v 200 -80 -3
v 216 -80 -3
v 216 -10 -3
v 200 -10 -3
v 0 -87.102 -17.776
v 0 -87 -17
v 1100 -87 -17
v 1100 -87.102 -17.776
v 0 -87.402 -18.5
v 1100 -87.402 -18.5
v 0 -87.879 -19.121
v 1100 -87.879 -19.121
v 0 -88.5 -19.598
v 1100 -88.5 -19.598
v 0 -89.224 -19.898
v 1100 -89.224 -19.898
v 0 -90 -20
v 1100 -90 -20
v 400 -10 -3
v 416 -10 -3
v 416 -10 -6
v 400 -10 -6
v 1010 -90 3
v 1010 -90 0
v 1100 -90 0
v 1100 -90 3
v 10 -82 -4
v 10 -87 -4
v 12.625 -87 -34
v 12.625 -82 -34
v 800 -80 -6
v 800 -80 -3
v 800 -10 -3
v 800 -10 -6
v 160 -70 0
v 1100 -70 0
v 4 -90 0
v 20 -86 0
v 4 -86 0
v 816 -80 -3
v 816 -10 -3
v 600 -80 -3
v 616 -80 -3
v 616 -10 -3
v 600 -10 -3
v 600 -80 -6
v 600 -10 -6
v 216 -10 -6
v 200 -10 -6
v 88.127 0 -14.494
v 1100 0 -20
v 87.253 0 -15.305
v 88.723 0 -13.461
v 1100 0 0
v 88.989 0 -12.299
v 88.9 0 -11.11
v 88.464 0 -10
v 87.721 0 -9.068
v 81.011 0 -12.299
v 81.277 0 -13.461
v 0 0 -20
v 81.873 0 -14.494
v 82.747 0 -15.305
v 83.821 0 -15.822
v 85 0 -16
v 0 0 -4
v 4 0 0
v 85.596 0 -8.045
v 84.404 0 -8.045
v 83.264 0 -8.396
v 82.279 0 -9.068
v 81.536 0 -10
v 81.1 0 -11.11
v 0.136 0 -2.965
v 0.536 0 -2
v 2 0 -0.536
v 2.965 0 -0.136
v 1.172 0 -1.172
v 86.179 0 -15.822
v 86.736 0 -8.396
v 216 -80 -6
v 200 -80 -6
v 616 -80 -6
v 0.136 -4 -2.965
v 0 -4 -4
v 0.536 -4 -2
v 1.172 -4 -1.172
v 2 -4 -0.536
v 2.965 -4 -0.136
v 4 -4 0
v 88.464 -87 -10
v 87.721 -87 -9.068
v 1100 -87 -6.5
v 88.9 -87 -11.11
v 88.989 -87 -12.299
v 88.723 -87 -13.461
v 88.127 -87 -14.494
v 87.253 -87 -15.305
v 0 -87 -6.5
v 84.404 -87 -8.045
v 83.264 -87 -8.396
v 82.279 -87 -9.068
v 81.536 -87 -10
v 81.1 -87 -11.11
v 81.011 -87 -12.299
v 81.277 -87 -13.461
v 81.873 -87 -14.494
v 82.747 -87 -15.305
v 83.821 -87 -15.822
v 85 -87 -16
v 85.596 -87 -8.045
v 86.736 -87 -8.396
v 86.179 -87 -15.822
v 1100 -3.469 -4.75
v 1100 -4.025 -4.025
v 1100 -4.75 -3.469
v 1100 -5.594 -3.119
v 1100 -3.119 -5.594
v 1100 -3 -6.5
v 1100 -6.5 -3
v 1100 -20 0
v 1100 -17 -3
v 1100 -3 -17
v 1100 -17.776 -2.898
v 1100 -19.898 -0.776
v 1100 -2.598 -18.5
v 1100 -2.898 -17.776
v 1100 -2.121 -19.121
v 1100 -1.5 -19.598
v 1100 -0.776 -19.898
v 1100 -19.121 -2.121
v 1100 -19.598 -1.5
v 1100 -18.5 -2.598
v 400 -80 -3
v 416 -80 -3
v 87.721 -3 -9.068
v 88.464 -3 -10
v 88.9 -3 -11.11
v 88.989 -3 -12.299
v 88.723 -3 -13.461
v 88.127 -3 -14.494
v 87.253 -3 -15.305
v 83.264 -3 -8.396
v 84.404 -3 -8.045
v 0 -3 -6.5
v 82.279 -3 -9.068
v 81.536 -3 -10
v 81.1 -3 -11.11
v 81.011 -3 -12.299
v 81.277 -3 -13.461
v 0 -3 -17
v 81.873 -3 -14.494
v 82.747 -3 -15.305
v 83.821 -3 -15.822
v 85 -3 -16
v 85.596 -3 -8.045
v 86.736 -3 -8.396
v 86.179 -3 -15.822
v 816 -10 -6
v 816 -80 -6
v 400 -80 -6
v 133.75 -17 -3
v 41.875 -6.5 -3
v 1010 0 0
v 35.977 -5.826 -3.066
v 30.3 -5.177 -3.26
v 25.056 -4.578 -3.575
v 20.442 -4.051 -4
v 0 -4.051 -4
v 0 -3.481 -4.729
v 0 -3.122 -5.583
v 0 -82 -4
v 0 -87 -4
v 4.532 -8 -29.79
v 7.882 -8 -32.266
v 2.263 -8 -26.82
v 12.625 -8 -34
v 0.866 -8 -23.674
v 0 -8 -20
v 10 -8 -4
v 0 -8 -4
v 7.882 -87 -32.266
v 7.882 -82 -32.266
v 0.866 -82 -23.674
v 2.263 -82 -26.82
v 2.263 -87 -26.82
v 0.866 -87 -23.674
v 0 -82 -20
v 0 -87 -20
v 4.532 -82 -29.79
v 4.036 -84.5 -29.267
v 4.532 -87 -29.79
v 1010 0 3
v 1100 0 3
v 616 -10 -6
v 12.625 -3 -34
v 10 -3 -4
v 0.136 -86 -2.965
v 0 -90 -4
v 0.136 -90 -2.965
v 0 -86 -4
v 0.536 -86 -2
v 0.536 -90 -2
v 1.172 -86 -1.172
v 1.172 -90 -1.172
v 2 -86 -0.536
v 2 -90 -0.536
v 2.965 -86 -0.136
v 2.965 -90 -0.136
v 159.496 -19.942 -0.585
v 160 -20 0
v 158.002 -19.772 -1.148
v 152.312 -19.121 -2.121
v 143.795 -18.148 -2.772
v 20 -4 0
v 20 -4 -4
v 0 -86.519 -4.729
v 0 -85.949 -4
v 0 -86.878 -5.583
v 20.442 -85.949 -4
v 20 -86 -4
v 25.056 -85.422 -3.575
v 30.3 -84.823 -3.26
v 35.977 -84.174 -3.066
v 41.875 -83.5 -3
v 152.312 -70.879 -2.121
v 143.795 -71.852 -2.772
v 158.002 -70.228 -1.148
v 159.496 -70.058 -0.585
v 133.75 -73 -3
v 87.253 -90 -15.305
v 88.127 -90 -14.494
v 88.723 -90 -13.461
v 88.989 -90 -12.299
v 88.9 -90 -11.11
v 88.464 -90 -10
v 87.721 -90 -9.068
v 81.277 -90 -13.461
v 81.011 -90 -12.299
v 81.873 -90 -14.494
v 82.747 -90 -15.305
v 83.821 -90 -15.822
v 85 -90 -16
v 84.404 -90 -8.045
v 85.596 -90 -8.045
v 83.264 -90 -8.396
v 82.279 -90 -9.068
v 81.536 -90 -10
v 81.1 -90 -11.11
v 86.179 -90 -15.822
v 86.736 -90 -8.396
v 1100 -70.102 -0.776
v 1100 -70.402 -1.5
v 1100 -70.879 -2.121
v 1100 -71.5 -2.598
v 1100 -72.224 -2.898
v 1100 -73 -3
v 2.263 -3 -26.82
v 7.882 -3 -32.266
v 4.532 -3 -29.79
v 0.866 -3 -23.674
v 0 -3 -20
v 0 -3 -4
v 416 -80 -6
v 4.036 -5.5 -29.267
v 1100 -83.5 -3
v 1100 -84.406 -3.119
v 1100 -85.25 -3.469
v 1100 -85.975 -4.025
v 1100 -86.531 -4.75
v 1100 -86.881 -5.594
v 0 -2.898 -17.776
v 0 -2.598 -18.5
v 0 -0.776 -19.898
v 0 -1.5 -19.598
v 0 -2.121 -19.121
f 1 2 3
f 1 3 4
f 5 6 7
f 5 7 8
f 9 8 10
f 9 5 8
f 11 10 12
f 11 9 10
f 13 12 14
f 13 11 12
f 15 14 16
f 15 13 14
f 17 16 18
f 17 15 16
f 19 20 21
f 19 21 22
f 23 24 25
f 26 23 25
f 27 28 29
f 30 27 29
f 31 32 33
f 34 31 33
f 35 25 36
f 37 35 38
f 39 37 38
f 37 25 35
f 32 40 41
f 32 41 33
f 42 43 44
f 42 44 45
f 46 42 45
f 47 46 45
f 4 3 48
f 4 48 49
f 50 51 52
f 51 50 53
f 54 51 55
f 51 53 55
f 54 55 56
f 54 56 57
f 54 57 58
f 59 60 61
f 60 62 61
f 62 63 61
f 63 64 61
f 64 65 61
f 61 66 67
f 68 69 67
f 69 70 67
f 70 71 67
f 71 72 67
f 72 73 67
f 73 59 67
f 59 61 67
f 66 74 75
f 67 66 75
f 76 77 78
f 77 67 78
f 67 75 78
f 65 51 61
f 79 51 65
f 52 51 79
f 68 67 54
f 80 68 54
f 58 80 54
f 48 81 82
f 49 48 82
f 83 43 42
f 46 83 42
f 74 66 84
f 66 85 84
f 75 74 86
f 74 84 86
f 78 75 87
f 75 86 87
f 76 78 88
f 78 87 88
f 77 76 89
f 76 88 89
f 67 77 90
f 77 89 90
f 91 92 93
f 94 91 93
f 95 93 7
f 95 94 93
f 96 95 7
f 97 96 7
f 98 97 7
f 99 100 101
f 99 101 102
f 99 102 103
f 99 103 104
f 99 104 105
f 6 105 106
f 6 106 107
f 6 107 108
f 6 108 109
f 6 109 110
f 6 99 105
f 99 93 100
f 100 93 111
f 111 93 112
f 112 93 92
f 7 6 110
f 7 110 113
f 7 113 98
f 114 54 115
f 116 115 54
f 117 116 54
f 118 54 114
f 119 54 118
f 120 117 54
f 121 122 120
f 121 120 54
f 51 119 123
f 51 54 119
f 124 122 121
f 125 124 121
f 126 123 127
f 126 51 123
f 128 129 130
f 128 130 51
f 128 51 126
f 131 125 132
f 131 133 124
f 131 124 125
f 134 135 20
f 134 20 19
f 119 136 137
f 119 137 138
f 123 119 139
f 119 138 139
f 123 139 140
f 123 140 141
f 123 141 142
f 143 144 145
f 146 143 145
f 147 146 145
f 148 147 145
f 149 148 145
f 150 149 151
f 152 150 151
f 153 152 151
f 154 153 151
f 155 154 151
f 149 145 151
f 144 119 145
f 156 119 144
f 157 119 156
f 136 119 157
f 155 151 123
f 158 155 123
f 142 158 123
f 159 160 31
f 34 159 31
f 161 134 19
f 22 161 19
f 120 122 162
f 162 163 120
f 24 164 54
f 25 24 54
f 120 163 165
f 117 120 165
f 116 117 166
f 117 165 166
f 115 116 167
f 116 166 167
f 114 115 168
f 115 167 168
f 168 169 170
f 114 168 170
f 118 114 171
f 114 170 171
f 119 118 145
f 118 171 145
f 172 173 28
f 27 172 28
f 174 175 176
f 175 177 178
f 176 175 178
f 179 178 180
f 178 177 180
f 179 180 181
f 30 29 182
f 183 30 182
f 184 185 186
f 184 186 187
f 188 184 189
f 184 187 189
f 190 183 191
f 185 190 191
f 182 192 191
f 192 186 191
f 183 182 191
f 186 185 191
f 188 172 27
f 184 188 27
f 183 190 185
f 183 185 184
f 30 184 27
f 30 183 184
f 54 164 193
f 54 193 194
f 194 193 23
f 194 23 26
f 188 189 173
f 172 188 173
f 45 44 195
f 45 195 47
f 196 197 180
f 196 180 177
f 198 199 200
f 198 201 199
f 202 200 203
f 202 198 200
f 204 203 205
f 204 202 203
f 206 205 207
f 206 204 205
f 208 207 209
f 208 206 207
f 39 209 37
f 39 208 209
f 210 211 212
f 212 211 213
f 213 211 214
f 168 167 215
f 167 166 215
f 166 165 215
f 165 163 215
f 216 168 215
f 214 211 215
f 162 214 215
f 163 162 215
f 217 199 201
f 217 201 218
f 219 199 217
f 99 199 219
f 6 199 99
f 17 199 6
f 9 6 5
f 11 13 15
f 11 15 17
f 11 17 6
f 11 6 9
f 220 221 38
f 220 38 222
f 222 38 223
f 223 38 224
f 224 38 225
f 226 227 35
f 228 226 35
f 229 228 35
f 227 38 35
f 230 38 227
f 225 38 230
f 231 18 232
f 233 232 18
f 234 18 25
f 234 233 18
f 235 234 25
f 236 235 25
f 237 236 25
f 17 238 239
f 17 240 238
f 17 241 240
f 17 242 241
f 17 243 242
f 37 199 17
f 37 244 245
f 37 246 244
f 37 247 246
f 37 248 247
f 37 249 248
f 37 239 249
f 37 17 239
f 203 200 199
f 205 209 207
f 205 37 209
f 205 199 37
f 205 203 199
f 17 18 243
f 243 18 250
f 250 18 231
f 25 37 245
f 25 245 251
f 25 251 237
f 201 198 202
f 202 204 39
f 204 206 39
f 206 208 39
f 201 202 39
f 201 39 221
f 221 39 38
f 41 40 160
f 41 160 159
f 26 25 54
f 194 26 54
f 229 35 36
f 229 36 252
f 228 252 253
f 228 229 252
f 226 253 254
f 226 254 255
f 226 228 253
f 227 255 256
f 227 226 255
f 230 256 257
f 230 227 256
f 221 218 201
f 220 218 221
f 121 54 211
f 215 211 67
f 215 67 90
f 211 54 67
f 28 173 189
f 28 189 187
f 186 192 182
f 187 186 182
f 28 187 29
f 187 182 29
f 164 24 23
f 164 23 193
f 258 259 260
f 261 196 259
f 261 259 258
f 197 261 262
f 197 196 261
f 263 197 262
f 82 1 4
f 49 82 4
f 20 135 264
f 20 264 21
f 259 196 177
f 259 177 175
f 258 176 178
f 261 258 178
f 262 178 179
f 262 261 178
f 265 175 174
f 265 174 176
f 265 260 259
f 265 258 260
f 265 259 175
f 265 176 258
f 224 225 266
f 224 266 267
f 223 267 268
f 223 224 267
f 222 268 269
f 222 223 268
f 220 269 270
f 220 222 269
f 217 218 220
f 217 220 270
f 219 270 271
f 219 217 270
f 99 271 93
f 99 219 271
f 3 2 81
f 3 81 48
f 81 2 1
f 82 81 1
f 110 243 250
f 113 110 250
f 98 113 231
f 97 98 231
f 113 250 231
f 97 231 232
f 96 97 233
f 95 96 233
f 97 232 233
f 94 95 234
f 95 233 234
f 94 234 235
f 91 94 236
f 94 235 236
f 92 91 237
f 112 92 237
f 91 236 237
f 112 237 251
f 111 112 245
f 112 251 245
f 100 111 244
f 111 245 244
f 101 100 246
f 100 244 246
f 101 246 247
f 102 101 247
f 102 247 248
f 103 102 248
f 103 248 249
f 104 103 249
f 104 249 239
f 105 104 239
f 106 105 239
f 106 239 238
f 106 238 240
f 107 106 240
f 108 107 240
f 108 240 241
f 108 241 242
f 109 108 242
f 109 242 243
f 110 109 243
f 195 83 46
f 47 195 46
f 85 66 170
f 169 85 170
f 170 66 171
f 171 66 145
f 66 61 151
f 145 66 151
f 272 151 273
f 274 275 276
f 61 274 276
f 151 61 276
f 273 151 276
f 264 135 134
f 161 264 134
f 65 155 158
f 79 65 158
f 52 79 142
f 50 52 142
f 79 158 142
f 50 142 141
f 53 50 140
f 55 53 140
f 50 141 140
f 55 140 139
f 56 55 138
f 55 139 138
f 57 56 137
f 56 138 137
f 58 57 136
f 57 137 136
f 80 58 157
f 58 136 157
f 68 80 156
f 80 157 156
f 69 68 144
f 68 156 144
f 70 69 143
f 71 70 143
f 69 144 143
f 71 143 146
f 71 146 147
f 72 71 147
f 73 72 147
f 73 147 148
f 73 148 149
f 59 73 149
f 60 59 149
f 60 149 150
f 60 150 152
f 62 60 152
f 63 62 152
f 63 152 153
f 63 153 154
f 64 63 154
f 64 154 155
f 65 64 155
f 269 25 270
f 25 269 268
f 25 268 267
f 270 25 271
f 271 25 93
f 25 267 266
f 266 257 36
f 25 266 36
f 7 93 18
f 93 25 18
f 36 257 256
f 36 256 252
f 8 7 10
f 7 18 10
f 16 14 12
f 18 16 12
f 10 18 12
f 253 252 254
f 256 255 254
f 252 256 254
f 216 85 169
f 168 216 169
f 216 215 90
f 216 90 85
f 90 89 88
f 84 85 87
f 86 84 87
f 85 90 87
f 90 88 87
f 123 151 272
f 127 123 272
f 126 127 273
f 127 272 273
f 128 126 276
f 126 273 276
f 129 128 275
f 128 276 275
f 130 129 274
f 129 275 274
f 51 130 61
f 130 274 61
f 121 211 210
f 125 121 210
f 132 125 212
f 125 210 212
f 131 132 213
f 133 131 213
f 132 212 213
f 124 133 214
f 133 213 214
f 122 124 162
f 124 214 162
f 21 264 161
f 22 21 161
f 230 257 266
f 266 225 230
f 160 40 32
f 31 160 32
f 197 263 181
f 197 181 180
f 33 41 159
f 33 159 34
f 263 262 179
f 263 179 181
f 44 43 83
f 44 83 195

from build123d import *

# Parameters (mm, degrees)
L_ANGLE_EQUAL_20X20X3_6_DEPTH = 1100
L_ANGLE_EQUAL_20X20X3_7_DEPTH = 1100
SKETCH16_R                    = 4
CUT_EXTRUDE1_DEPTH            = 1104.85687478
SKETCH18_W                    = 90
SKETCH18_H                    = 90
BOSS_EXTRUDE1_DEPTH           = 3
CUT_EXTRUDE2_DEPTH            = 4
BOSS_EXTRUDE2_DEPTH           = 5
BOSS_EXTRUDE3_DEPTH           = 5
FILLET1_R                     = 4
FILLET2_R                     = 4
SKETCH23_W                    = 16
SKETCH23_H                    = 70
BOSS_EXTRUDE4_DEPTH           = 3
BOSS_EXTRUDE4_2_DEPTH         = 3
BOSS_EXTRUDE4_3_DEPTH         = 3
BOSS_EXTRUDE4_4_DEPTH         = 3


with BuildPart() as part:
    # Sketch17 → L angle (equal) 20X20X3(6) (new body)
    with BuildSketch(Plane(origin=(0, 0, 0), x_dir=(0, -1, 0), z_dir=(1, 0, 0))):
        with BuildLine():
            Line((0, 20), (0, 0))
            Line((0, 0), (20, 0))
            ThreePointArc((20, 0), (19.121320344, 2.121320344), (17, 3))
            Line((17, 3), (6.5, 3))
            ThreePointArc((6.5, 3), (4.025126266, 4.025126266), (3, 6.5))
            Line((3, 6.5), (3, 17))
            ThreePointArc((3, 17), (2.121320344, 19.121320344), (0, 20))
        make_face()
    extrude(amount=L_ANGLE_EQUAL_20X20X3_6_DEPTH)


with BuildPart() as body_2:
    # Sketch19 → L angle (equal) 20X20X3(7) (new body)
    with BuildSketch(Plane(origin=(0, -90, 0), x_dir=(0, 1, 0), z_dir=(-1, 0, 0))):
        with BuildLine():
            Line((0, 20), (0, 0))
            Line((0, 0), (20, 0))
            ThreePointArc((20, 0), (19.121320344, 2.121320344), (17, 3))
            Line((17, 3), (6.5, 3))
            ThreePointArc((6.5, 3), (4.025126266, 4.025126266), (3, 6.5))
            Line((3, 6.5), (3, 17))
            ThreePointArc((3, 17), (2.121320344, 19.121320344), (0, 20))
        make_face()
    extrude(amount=-L_ANGLE_EQUAL_20X20X3_7_DEPTH)


with BuildPart() as cut_extrude1_tool:
    # Sketch16 → Cut-Extrude1 (new, through all)
    with BuildSketch(Plane.XZ.offset(90)):
        with Locations(Location((85, -12, 0), (0, 0, 270))):
            Circle(SKETCH16_R)
    extrude(amount=-CUT_EXTRUDE1_DEPTH)


with BuildPart() as part_1:
    add(part.part)

    # Cut-Extrude1: cut by cut_extrude1_tool
    add(cut_extrude1_tool.part, mode=Mode.SUBTRACT)


with BuildPart() as body_2_1:
    add(body_2.part)

    # Cut-Extrude1: cut by cut_extrude1_tool
    add(cut_extrude1_tool.part, mode=Mode.SUBTRACT)


with BuildPart() as body_3:
    # Sketch18 → Boss-Extrude1 (new body)
    with BuildSketch(Plane.XY):
        with Locations((1055, -45)):
            Rectangle(SKETCH18_W, SKETCH18_H)
    extrude(amount=BOSS_EXTRUDE1_DEPTH)


with BuildPart() as cut_extrude2_tool:
    # Sketch20 → Cut-Extrude2 (new body)
    with BuildSketch(Plane.XY):
        Polygon((0, -86), (20, -86), (160, -70), (0, -70), align=None)
        Polygon((0, -20), (160, -20), (20, -4), (0, -4), align=None)
    extrude(amount=-CUT_EXTRUDE2_DEPTH)


with BuildPart() as part_2:
    add(part_1.part)

    # Cut-Extrude2: cut by cut_extrude2_tool
    add(cut_extrude2_tool.part, mode=Mode.SUBTRACT)

    # Fillet2
    fillet2_edges = [part_2.edges().sort_by_distance(p)[0] for p in [
        (0, -2, 0),
    ]]
    fillet(fillet2_edges, radius=FILLET2_R)


with BuildPart() as body_2_2:
    add(body_2_1.part)

    # Cut-Extrude2: cut by cut_extrude2_tool
    add(cut_extrude2_tool.part, mode=Mode.SUBTRACT)

    # Fillet1
    fillet1_edges = [body_2_2.edges().sort_by_distance(p)[0] for p in [
        (0, -88, 0),
    ]]
    fillet(fillet1_edges, radius=FILLET1_R)


with BuildPart() as body_4:
    # Sketch21 → Boss-Extrude2 (new body)
    with BuildSketch(Plane.XZ.offset(3)):
        with BuildLine():
            Line((0, -4), (10, -4))
            Line((10, -4), (12.62465991, -34))
            add(Edge.make_bspline(
                [(12.62465991, -34), (1.75888124, -31.534337235), (0, -20)],
                knots=[0, 0, 0, 1, 1, 1], degree=2))
            Line((0, -20), (0, -4))
        make_face()
    extrude(amount=BOSS_EXTRUDE2_DEPTH)


with BuildPart() as body_5:
    # Sketch22 → Boss-Extrude3 (new body)
    with BuildSketch(Plane(origin=(0, -87, 0), x_dir=(1, 0, 0), z_dir=(0, 1, 0))):
        with BuildLine():
            Line((0, 20), (0, 4))
            Line((0, 4), (10, 4))
            Line((10, 4), (12.62465991, 34))
            add(Edge.make_bspline(
                [(12.62465991, 34), (1.75888124, 31.534337235), (0, 20)],
                knots=[0, 0, 0, 1, 1, 1], degree=2))
        make_face()
    extrude(amount=BOSS_EXTRUDE3_DEPTH)


with BuildPart() as body_6:
    # Sketch23 → Boss-Extrude4 (new body)
    with BuildSketch(Plane(origin=(0, 0, -3), x_dir=(-1, 0, 0), z_dir=(0, 0, -1))):
        with Locations((-408, -45)):
            Rectangle(SKETCH23_W, SKETCH23_H)
    extrude(amount=BOSS_EXTRUDE4_DEPTH)


with BuildPart() as body_7:
    # Sketch23 → Boss-Extrude4 2 (new body)
    with BuildSketch(Plane(origin=(0, 0, -3), x_dir=(-1, 0, 0), z_dir=(0, 0, -1))):
        with Locations((-608, -45)):
            Rectangle(SKETCH23_W, SKETCH23_H)
    extrude(amount=BOSS_EXTRUDE4_2_DEPTH)


with BuildPart() as body_8:
    # Sketch23 → Boss-Extrude4 3 (new body)
    with BuildSketch(Plane(origin=(0, 0, -3), x_dir=(-1, 0, 0), z_dir=(0, 0, -1))):
        with Locations((-208, -45)):
            Rectangle(SKETCH23_W, SKETCH23_H)
    extrude(amount=BOSS_EXTRUDE4_3_DEPTH)


with BuildPart() as body_9:
    # Sketch23 → Boss-Extrude4 4 (new body)
    with BuildSketch(Plane(origin=(0, 0, -3), x_dir=(-1, 0, 0), z_dir=(0, 0, -1))):
        with Locations((-808, -45)):
            Rectangle(SKETCH23_W, SKETCH23_H)
    extrude(amount=BOSS_EXTRUDE4_4_DEPTH)


solid = Compound([body_3.part, part_2.part, body_2_2.part, body_4.part, body_5.part, body_6.part, body_7.part, body_8.part, body_9.part])
